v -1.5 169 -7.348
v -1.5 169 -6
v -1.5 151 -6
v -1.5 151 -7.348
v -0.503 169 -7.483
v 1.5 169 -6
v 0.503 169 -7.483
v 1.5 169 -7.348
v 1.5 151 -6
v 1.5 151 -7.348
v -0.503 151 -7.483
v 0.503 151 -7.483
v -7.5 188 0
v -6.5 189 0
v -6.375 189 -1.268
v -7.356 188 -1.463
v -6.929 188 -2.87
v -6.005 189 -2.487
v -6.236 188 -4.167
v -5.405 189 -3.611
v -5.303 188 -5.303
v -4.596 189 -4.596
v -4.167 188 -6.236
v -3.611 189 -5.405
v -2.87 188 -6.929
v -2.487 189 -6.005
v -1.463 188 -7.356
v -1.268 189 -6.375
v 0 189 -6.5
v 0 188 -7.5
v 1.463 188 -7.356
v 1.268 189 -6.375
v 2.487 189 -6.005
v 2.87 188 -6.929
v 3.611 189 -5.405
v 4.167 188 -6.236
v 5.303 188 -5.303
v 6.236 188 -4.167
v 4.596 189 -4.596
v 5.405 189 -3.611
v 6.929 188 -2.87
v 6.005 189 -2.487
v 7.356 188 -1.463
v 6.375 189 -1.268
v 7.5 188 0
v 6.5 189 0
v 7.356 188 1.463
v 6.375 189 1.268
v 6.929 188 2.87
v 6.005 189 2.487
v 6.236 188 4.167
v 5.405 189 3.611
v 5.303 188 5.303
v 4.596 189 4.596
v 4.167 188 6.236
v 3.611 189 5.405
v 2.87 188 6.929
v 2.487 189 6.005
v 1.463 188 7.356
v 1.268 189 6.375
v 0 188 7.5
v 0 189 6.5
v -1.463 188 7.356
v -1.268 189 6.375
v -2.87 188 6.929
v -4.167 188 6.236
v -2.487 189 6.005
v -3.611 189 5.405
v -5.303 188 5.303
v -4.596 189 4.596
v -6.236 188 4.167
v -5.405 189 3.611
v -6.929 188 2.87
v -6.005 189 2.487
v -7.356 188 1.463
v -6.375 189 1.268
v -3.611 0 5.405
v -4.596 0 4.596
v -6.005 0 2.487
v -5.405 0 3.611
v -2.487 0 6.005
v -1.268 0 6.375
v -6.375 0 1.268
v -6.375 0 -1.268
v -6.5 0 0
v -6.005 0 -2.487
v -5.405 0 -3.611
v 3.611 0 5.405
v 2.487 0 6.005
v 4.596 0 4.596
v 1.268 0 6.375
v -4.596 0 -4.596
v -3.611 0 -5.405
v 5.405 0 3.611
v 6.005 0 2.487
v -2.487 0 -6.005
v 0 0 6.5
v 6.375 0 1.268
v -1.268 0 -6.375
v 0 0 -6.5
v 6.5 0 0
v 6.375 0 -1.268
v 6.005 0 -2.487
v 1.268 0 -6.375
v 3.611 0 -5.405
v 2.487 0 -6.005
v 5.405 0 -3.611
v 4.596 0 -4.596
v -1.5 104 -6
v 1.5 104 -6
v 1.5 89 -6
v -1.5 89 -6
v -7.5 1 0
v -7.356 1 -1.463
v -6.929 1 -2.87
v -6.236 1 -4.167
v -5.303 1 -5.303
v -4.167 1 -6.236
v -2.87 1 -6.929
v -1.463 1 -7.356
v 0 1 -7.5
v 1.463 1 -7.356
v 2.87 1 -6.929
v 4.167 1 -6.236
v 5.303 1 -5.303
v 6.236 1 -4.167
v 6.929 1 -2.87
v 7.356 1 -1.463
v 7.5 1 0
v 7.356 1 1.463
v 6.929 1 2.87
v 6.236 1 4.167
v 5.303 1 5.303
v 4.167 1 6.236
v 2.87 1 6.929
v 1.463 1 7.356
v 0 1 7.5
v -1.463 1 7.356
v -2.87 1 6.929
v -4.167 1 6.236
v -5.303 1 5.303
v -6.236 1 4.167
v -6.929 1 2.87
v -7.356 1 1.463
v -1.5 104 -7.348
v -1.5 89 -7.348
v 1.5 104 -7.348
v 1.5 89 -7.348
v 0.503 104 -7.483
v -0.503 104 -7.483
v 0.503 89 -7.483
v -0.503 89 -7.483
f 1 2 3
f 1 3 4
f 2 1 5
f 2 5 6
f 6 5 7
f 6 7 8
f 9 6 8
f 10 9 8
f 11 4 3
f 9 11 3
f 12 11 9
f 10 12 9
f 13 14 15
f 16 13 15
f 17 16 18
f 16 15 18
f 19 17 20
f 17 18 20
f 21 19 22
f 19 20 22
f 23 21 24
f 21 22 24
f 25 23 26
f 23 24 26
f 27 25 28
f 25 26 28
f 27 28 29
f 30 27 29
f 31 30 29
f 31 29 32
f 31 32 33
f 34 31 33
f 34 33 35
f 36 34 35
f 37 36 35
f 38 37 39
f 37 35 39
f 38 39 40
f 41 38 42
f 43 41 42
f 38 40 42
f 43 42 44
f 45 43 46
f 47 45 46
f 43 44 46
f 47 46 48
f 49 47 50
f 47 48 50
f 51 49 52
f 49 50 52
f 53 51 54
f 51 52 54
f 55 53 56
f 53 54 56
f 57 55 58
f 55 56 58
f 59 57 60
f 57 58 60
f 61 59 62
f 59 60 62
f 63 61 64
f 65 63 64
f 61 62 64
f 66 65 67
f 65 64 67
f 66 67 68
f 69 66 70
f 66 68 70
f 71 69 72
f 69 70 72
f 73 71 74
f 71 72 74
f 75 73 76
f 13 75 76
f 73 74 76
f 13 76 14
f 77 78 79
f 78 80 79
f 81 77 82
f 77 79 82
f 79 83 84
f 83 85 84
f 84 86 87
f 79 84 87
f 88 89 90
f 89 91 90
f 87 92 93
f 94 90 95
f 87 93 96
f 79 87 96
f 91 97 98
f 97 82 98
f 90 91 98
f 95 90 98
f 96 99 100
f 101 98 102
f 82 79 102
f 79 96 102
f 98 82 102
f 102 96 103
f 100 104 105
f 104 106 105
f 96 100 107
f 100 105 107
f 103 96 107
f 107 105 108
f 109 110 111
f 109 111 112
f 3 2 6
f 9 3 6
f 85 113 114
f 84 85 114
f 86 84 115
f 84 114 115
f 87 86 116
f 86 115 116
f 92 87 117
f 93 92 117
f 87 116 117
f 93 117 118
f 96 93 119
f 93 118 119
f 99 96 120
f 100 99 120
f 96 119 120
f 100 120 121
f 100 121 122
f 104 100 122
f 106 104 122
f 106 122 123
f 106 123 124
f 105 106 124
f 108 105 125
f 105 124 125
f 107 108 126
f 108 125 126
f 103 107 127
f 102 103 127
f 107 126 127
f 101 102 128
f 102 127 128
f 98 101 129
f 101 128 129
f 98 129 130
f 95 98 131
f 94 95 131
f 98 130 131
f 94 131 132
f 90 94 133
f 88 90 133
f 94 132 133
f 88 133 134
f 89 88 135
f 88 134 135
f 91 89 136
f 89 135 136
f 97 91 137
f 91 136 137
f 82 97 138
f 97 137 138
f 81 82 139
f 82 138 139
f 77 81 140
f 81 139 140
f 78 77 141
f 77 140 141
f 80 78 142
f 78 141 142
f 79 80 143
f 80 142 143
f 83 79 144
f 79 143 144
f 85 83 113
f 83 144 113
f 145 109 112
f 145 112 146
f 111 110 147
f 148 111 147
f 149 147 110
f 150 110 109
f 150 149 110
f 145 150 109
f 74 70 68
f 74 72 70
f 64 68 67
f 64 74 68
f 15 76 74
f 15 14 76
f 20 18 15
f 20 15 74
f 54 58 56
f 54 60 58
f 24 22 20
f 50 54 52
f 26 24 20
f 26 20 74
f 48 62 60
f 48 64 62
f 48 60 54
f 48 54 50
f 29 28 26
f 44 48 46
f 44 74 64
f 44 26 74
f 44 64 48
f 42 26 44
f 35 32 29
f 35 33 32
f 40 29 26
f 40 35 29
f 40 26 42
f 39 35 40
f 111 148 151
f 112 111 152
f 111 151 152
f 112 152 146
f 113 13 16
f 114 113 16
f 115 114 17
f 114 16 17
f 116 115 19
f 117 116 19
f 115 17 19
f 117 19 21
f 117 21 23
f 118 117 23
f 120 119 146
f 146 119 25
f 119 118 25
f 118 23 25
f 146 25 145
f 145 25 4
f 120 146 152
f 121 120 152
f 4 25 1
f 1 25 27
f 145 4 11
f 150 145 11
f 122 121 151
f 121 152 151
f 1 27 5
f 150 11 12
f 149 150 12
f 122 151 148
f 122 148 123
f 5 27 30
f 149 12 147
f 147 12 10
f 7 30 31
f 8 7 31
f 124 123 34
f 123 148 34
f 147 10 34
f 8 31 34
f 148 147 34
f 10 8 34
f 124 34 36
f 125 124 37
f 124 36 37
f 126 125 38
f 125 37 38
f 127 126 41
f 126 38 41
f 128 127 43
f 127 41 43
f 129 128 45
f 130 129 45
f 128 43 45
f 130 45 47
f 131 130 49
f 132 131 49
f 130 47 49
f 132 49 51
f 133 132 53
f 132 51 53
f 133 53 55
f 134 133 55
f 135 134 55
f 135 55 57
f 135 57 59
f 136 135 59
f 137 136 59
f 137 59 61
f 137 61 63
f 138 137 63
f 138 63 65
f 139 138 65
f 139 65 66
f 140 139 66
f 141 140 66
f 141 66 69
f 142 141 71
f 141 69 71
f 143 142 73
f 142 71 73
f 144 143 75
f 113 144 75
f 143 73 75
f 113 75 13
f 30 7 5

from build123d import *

# Parameters (mm, degrees)
SKETCH1_W          = 7.5
SKETCH1_H          = 189
SKETCH2_W          = 3
SKETCH2_H          = 3
CUT_EXTRUDE1_DEPTH = 18
SKETCH3_W          = 3
SKETCH3_H          = 3
CUT_EXTRUDE2_DEPTH = 15
CHAMFER1_SIZE      = 1


with BuildPart() as part:
    # Sketch1 → Revolve1 (revolve)
    with BuildSketch(Plane.XY, mode=Mode.PRIVATE) as revolve1_sk:
        with Locations((3.75, 94.5)):
            Rectangle(SKETCH1_W, SKETCH1_H)
    revolve(revolve1_sk.sketch.rotate(Axis((0, 189, 0), (0, -1, 0)), 180), axis=Axis((0, 189, 0), (0, -1, 0)))

    # Sketch2 → Cut-Extrude1 (cut)
    with BuildSketch(Plane(origin=(0, 169, 0), x_dir=(1, 0, 0), z_dir=(0, 1, 0))):
        with Locations((0, 7.5)):
            Rectangle(SKETCH2_W, SKETCH2_H)
    extrude(amount=-CUT_EXTRUDE1_DEPTH, mode=Mode.SUBTRACT)

    # Sketch3 → Cut-Extrude2 (cut)
    with BuildSketch(Plane(origin=(0, 104, 0), x_dir=(-1, 0, 0), z_dir=(0, -1, 0))):
        with Locations((0, 7.5)):
            Rectangle(SKETCH3_W, SKETCH3_H)
    extrude(amount=CUT_EXTRUDE2_DEPTH, mode=Mode.SUBTRACT)

    # Chamfer1
    chamfer1_edges = [part.edges().sort_by_distance(p)[0] for p in [
        (7.5, 0, 0),
        (7.5, 189, 0),
    ]]
    chamfer(chamfer1_edges, length=CHAMFER1_SIZE)


solid = part.part
